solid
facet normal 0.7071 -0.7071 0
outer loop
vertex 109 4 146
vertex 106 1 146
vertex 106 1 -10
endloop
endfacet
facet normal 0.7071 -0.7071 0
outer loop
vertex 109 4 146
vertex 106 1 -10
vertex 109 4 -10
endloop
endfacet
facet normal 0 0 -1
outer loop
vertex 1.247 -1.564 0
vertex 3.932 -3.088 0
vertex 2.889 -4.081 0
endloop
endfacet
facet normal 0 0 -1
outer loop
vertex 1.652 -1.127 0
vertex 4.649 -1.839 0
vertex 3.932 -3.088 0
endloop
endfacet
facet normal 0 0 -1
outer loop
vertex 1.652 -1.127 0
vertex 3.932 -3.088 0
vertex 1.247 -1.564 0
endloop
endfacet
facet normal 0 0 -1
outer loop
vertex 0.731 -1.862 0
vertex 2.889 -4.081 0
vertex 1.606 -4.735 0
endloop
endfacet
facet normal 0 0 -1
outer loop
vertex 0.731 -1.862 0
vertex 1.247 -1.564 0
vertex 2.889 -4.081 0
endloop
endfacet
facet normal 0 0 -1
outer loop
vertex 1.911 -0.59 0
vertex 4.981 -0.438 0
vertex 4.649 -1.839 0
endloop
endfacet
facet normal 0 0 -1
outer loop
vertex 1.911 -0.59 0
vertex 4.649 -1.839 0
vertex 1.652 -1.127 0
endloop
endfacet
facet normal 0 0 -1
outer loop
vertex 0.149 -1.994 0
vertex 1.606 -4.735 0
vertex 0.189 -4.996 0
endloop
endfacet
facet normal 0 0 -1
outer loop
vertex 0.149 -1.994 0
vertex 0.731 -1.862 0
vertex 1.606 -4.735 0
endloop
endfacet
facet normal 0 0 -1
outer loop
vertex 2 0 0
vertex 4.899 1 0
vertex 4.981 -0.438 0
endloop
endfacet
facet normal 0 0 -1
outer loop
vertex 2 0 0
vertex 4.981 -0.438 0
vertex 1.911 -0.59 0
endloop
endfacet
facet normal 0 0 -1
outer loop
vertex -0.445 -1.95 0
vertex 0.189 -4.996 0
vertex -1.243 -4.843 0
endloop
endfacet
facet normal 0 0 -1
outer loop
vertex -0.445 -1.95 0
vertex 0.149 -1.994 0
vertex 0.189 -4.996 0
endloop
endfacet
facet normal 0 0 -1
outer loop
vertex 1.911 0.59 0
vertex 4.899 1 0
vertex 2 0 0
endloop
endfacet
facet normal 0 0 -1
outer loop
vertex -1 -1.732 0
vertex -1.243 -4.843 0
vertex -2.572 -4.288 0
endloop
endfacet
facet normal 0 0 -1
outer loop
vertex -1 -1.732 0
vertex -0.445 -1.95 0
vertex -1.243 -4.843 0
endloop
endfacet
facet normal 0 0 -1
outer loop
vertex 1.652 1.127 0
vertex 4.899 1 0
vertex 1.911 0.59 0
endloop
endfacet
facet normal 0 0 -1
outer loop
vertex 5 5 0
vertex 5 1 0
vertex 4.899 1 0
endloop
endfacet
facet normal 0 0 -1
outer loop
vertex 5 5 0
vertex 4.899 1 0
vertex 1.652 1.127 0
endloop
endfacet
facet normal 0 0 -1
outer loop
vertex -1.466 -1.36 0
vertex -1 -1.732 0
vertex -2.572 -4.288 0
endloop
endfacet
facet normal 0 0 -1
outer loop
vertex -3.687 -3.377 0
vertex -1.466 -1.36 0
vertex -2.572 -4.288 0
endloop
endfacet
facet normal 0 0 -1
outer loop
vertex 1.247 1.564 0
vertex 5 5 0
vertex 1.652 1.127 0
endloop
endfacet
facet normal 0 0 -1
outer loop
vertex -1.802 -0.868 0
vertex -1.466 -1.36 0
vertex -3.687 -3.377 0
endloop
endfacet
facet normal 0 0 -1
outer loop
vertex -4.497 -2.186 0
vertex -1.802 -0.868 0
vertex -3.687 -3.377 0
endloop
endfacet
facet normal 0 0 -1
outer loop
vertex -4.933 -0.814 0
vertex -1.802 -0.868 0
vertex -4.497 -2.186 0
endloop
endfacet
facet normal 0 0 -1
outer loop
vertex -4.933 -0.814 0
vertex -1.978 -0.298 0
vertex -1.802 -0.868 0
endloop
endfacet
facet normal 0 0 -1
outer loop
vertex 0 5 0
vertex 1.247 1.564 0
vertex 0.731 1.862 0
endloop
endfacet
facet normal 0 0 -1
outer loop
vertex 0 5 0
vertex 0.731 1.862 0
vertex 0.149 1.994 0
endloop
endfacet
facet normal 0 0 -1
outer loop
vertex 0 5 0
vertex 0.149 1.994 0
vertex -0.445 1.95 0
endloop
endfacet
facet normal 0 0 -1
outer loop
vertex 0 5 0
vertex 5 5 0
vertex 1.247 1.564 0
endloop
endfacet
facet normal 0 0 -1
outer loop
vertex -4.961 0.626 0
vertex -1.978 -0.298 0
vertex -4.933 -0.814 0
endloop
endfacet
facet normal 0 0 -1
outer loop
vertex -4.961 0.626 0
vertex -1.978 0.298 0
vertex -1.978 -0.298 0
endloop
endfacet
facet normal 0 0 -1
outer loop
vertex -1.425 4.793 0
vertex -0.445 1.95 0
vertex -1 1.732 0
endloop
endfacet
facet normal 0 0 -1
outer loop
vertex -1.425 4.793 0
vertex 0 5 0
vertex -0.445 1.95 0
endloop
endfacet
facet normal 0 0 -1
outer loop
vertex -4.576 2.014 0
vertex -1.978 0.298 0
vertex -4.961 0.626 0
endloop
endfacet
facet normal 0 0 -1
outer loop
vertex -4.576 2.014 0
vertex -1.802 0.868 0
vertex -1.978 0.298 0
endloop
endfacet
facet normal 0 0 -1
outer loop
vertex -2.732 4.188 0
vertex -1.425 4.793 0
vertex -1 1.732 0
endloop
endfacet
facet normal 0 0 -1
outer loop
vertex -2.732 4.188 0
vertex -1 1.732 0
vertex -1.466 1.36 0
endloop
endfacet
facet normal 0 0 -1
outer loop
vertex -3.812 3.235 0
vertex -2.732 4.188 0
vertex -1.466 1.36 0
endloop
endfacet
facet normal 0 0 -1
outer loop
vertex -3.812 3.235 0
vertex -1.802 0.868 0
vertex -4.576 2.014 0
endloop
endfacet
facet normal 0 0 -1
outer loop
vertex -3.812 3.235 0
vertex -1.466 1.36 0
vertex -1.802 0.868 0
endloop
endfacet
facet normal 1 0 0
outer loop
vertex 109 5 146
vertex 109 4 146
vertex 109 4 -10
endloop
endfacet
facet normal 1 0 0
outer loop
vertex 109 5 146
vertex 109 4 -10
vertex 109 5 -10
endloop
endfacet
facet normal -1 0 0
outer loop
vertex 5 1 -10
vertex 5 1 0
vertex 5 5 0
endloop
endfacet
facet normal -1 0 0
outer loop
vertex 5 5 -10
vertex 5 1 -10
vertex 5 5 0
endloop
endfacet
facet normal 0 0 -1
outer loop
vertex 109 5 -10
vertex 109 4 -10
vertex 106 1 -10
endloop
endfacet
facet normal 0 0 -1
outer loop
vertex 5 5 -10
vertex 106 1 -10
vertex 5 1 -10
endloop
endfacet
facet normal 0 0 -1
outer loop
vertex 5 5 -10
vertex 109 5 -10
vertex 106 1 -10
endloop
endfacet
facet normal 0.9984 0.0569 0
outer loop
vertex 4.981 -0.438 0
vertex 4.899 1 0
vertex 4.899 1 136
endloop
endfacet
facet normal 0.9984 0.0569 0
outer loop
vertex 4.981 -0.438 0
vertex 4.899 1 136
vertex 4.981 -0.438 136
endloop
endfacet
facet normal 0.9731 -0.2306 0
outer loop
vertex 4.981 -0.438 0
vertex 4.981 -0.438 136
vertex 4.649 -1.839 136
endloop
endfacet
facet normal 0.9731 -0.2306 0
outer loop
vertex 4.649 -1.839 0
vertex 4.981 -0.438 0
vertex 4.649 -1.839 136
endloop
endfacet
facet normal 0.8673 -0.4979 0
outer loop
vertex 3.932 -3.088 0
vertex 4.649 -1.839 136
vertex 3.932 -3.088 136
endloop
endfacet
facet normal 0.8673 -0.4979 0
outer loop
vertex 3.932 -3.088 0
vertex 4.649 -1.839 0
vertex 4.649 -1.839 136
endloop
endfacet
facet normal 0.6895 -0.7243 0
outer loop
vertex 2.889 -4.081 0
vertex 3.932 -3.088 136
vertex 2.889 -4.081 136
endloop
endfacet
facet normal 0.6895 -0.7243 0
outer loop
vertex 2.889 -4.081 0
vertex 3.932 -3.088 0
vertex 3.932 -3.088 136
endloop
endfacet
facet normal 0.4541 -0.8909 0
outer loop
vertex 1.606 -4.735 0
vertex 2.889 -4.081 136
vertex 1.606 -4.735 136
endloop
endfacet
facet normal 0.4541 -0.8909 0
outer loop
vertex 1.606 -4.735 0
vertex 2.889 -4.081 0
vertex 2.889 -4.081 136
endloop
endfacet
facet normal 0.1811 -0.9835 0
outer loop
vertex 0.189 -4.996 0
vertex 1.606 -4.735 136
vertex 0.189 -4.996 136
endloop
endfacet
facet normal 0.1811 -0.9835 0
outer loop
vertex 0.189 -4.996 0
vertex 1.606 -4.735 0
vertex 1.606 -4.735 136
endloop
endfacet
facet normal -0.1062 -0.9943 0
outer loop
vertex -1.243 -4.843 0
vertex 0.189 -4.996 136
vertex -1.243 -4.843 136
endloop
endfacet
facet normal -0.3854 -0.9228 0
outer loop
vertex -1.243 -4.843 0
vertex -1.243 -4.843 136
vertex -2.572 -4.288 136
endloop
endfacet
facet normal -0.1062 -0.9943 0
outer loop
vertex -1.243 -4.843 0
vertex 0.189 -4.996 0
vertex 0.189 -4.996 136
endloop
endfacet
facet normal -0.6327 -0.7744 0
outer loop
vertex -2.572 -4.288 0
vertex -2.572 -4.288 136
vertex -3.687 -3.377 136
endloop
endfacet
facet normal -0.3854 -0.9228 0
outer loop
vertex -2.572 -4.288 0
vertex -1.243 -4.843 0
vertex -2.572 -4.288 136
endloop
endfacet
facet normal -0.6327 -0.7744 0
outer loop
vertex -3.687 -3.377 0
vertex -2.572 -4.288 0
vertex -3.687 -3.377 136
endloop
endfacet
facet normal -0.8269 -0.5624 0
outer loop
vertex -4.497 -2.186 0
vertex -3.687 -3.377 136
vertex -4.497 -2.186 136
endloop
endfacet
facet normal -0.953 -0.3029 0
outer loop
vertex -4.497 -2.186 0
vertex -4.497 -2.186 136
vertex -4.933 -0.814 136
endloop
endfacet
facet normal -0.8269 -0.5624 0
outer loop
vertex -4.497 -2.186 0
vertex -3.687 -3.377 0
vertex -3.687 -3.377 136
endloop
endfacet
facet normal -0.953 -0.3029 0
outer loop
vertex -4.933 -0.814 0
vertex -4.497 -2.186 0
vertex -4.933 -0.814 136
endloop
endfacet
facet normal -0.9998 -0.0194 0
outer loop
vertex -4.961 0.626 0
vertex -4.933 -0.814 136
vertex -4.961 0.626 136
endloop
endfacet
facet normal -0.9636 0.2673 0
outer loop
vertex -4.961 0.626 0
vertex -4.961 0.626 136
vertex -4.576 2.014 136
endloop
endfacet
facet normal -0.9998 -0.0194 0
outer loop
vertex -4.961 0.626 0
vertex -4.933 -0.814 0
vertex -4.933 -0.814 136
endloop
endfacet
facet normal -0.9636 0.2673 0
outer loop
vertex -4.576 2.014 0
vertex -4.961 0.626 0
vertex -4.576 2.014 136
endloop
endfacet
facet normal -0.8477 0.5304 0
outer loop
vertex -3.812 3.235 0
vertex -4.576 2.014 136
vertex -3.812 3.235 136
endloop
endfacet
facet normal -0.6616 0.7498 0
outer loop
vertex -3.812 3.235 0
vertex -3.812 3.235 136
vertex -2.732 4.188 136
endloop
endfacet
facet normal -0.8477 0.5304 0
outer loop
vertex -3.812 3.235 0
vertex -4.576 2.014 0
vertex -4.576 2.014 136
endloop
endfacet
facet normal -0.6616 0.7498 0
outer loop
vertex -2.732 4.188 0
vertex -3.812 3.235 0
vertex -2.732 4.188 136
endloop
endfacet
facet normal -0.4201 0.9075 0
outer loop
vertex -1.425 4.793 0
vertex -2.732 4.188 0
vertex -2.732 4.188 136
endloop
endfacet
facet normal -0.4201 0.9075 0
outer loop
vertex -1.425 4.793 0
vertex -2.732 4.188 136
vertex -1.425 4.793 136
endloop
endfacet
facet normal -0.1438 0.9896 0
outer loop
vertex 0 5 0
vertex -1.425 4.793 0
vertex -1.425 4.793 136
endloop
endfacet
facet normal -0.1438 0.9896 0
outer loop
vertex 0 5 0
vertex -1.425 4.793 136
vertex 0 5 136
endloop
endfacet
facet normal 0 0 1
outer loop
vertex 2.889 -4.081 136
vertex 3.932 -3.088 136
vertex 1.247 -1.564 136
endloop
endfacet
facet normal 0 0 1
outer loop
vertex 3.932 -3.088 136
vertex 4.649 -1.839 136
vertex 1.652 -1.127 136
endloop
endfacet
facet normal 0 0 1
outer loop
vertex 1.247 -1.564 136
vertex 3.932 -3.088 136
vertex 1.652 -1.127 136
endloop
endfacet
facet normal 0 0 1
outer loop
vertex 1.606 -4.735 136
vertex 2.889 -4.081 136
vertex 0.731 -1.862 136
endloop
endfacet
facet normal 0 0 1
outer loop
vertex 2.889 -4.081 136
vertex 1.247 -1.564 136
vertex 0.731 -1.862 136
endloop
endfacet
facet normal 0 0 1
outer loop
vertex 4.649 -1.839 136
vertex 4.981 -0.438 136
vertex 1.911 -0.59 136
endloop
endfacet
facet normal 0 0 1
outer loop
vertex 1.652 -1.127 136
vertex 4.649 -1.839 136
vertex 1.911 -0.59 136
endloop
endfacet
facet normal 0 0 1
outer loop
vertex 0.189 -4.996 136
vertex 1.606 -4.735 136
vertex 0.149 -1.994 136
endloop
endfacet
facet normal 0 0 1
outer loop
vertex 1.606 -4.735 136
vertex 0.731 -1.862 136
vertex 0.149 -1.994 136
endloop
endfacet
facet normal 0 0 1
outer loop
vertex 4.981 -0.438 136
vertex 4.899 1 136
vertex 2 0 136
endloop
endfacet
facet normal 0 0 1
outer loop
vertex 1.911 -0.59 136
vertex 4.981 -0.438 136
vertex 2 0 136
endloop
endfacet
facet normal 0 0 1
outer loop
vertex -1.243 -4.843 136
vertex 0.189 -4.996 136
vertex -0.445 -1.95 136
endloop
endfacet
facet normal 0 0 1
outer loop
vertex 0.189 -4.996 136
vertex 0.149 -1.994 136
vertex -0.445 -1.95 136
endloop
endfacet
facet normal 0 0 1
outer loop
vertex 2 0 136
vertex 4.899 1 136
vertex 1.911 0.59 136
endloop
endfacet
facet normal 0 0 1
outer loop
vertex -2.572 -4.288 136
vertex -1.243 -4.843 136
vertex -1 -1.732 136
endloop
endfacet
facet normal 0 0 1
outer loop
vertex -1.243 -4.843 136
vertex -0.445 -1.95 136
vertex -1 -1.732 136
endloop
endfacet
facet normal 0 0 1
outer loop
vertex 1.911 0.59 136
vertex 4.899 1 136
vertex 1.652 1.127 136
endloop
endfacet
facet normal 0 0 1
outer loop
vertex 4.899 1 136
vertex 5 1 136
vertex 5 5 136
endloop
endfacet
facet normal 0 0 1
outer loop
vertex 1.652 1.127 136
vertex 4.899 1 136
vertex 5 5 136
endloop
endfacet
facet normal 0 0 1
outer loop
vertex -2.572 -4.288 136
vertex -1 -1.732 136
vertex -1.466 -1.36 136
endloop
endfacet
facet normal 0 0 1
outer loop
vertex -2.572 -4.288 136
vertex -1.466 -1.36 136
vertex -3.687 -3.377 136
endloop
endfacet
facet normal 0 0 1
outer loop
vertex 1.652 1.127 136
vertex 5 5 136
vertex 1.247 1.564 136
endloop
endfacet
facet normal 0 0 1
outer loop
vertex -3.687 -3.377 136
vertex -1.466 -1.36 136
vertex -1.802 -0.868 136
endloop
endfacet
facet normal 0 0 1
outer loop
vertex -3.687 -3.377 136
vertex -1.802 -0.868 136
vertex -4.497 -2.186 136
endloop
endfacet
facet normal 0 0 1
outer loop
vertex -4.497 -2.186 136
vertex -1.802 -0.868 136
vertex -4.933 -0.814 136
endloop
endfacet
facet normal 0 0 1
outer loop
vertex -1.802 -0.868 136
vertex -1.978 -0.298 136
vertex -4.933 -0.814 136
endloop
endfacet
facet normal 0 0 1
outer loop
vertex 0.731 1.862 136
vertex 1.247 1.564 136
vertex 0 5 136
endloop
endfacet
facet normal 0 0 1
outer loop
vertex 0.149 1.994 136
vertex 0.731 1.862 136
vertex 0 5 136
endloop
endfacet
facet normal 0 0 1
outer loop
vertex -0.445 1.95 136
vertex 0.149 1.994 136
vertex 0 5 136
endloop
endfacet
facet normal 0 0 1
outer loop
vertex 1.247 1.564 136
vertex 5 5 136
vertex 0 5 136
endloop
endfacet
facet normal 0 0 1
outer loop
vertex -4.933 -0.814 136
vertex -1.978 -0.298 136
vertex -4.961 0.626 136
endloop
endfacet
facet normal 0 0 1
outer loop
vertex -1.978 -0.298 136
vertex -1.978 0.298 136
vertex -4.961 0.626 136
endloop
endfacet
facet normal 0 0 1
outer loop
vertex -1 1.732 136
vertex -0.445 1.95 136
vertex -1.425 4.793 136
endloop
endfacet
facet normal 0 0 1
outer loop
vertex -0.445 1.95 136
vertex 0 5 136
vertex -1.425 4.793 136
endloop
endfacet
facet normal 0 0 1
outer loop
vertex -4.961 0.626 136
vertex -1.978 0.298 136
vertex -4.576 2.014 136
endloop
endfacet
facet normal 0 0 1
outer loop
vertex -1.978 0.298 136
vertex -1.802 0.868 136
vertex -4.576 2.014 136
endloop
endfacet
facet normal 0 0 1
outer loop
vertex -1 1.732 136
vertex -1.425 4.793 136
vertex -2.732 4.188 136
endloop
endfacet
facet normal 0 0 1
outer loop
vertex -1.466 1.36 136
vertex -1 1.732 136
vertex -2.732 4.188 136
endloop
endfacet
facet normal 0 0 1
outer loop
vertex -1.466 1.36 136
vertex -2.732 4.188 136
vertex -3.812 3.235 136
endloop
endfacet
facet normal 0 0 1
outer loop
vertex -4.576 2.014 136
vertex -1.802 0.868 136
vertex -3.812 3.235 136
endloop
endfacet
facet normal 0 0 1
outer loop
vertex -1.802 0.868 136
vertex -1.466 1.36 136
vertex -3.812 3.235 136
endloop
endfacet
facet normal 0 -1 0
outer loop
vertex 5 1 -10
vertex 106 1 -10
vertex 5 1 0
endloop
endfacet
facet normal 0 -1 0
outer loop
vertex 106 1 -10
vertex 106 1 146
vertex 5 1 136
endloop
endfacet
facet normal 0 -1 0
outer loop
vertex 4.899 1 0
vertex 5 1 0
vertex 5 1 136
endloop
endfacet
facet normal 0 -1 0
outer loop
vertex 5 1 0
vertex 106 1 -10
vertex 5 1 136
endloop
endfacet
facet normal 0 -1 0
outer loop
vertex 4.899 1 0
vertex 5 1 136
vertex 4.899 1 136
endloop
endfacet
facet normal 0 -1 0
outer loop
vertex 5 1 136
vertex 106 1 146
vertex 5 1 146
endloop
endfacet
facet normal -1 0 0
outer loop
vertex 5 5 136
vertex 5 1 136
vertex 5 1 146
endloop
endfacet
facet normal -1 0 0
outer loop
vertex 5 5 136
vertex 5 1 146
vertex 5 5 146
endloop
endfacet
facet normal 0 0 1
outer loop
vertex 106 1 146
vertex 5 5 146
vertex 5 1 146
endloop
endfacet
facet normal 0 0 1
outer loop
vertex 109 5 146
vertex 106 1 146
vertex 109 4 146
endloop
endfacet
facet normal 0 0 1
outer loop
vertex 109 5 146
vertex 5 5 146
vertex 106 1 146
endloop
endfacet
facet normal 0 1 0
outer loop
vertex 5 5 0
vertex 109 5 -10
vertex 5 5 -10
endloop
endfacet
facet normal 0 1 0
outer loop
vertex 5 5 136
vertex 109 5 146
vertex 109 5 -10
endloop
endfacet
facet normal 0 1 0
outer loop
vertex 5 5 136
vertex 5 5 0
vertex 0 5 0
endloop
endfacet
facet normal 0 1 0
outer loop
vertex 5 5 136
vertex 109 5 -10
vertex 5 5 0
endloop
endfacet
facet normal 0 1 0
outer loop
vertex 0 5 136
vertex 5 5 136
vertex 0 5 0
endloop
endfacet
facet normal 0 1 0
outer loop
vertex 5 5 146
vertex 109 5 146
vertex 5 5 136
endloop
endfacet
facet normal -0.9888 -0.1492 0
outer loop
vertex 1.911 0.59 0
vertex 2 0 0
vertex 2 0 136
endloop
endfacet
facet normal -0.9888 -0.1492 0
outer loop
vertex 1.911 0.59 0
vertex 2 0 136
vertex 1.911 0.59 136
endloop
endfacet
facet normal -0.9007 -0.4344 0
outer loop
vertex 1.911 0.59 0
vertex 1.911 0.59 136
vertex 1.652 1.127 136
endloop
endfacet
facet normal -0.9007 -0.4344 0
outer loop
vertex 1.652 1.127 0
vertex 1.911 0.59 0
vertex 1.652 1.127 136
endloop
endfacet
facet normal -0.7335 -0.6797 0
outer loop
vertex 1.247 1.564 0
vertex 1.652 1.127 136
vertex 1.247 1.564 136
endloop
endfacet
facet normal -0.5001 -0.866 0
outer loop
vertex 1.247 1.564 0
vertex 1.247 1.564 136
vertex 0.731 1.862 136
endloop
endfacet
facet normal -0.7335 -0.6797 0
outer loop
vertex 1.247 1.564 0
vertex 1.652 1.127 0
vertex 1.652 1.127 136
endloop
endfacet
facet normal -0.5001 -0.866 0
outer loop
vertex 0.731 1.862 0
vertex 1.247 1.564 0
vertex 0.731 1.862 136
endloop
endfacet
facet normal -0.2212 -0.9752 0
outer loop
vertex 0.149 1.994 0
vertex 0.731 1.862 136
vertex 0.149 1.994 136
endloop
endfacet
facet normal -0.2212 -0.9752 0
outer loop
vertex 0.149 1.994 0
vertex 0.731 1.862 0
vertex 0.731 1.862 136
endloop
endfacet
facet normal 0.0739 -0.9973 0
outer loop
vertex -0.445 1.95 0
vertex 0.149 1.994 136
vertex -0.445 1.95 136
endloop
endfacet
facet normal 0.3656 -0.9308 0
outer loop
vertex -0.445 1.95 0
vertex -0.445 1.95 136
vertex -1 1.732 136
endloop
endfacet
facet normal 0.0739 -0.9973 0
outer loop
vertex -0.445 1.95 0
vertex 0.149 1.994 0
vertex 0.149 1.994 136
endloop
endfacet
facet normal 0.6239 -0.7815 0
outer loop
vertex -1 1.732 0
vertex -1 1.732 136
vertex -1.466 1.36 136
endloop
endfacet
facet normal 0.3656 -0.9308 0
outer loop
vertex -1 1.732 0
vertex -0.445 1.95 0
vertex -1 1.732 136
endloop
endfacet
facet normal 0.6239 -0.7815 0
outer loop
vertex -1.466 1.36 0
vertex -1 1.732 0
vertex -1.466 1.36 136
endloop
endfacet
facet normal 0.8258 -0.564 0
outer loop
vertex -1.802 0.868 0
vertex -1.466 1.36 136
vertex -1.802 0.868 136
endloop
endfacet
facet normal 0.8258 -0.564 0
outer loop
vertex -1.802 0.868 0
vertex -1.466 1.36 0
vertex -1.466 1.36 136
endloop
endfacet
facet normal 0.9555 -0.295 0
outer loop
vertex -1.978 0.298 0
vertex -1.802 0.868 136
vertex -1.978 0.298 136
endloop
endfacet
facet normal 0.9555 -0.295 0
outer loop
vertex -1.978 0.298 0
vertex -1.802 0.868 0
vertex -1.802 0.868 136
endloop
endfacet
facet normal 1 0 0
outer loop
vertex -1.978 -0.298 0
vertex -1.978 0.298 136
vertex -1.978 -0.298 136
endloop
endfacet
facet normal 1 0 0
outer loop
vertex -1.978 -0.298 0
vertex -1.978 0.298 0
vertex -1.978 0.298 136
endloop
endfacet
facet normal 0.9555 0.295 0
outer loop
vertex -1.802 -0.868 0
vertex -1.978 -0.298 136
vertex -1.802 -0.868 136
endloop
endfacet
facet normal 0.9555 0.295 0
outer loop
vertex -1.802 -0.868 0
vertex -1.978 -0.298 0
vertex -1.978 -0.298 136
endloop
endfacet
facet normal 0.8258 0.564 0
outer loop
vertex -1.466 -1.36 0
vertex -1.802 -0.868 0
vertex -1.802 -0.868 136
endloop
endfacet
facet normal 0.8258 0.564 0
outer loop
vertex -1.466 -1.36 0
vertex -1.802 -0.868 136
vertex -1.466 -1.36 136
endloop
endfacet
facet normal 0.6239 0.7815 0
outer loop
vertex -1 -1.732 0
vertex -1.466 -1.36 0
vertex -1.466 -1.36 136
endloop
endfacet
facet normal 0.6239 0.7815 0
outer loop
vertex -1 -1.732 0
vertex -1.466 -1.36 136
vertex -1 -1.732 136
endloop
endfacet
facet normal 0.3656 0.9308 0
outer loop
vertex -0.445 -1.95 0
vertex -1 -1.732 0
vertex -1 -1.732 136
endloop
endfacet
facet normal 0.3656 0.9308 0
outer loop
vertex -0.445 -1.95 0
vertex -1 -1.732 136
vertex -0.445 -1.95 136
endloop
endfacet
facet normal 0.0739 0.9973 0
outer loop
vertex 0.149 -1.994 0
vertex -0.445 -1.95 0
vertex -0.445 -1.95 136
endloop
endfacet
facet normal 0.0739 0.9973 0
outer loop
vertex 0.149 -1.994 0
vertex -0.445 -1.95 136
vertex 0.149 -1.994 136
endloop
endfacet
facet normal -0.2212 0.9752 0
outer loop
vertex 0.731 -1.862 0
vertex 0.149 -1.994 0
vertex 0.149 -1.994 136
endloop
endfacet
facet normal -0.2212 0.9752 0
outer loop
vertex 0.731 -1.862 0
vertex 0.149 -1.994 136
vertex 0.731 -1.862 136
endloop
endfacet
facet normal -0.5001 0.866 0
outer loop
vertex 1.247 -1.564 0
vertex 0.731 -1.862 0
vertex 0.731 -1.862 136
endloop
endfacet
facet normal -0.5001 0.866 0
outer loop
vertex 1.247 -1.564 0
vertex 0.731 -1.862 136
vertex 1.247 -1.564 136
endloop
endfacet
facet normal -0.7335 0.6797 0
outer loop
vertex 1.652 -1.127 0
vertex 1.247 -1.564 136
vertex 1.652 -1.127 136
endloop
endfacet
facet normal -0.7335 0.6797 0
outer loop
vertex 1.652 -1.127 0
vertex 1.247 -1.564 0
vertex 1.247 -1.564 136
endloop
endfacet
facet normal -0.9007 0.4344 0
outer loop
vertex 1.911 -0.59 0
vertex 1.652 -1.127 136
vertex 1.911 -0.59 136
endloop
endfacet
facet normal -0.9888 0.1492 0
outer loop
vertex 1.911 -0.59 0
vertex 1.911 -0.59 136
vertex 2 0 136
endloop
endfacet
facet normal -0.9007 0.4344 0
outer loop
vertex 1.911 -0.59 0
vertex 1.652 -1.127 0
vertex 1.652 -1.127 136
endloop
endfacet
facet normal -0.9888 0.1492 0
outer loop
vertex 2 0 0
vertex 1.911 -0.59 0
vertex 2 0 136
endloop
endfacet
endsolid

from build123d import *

# Parameters (mm, degrees)
SKETCH1_R           = 2
BOSS_EXTRUDE1_DEPTH = 136
SKETCH2_W           = 104
SKETCH2_H           = 4
BOSS_EXTRUDE2_DEPTH = 10
SKETCH3_W           = 104
SKETCH3_H           = 4
BOSS_EXTRUDE3_DEPTH = 10
CUT_EXTRUDE2_DEPTH  = 191.373317458


with BuildPart() as part:
    # Sketch1 → Boss-Extrude1 (new body)
    with BuildSketch(Plane.XY):
        with BuildLine():
            Line((0, 5), (109, 5))
            Line((109, 5), (109, 1))
            Line((109, 1), (4.898979486, 1))
            ThreePointArc((4.898979486, 1), (-3.16227766, -3.872983346), (0, 5))
        make_face()
        Circle(SKETCH1_R, mode=Mode.SUBTRACT)
    extrude(amount=BOSS_EXTRUDE1_DEPTH)

    # Sketch2 → Boss-Extrude2 (add)
    with BuildSketch(Plane.XY.offset(136)):
        with Locations((57, 3)):
            Rectangle(SKETCH2_W, SKETCH2_H)
    extrude(amount=BOSS_EXTRUDE2_DEPTH)

    # Sketch3 → Boss-Extrude3 (add)
    with BuildSketch(Plane(origin=(0, 0, 0), x_dir=(-1, 0, 0), z_dir=(0, 0, -1))):
        with Locations((-57, 3)):
            Rectangle(SKETCH3_W, SKETCH3_H)
    extrude(amount=BOSS_EXTRUDE3_DEPTH)

    # Sketch5 → Cut-Extrude2 (cut, through all)
    with BuildSketch(Plane.XY.offset(146)):
        Polygon((106, 1), (109, 4), (109, 1), align=None)
    extrude(amount=-CUT_EXTRUDE2_DEPTH, mode=Mode.SUBTRACT)


solid = part.part
